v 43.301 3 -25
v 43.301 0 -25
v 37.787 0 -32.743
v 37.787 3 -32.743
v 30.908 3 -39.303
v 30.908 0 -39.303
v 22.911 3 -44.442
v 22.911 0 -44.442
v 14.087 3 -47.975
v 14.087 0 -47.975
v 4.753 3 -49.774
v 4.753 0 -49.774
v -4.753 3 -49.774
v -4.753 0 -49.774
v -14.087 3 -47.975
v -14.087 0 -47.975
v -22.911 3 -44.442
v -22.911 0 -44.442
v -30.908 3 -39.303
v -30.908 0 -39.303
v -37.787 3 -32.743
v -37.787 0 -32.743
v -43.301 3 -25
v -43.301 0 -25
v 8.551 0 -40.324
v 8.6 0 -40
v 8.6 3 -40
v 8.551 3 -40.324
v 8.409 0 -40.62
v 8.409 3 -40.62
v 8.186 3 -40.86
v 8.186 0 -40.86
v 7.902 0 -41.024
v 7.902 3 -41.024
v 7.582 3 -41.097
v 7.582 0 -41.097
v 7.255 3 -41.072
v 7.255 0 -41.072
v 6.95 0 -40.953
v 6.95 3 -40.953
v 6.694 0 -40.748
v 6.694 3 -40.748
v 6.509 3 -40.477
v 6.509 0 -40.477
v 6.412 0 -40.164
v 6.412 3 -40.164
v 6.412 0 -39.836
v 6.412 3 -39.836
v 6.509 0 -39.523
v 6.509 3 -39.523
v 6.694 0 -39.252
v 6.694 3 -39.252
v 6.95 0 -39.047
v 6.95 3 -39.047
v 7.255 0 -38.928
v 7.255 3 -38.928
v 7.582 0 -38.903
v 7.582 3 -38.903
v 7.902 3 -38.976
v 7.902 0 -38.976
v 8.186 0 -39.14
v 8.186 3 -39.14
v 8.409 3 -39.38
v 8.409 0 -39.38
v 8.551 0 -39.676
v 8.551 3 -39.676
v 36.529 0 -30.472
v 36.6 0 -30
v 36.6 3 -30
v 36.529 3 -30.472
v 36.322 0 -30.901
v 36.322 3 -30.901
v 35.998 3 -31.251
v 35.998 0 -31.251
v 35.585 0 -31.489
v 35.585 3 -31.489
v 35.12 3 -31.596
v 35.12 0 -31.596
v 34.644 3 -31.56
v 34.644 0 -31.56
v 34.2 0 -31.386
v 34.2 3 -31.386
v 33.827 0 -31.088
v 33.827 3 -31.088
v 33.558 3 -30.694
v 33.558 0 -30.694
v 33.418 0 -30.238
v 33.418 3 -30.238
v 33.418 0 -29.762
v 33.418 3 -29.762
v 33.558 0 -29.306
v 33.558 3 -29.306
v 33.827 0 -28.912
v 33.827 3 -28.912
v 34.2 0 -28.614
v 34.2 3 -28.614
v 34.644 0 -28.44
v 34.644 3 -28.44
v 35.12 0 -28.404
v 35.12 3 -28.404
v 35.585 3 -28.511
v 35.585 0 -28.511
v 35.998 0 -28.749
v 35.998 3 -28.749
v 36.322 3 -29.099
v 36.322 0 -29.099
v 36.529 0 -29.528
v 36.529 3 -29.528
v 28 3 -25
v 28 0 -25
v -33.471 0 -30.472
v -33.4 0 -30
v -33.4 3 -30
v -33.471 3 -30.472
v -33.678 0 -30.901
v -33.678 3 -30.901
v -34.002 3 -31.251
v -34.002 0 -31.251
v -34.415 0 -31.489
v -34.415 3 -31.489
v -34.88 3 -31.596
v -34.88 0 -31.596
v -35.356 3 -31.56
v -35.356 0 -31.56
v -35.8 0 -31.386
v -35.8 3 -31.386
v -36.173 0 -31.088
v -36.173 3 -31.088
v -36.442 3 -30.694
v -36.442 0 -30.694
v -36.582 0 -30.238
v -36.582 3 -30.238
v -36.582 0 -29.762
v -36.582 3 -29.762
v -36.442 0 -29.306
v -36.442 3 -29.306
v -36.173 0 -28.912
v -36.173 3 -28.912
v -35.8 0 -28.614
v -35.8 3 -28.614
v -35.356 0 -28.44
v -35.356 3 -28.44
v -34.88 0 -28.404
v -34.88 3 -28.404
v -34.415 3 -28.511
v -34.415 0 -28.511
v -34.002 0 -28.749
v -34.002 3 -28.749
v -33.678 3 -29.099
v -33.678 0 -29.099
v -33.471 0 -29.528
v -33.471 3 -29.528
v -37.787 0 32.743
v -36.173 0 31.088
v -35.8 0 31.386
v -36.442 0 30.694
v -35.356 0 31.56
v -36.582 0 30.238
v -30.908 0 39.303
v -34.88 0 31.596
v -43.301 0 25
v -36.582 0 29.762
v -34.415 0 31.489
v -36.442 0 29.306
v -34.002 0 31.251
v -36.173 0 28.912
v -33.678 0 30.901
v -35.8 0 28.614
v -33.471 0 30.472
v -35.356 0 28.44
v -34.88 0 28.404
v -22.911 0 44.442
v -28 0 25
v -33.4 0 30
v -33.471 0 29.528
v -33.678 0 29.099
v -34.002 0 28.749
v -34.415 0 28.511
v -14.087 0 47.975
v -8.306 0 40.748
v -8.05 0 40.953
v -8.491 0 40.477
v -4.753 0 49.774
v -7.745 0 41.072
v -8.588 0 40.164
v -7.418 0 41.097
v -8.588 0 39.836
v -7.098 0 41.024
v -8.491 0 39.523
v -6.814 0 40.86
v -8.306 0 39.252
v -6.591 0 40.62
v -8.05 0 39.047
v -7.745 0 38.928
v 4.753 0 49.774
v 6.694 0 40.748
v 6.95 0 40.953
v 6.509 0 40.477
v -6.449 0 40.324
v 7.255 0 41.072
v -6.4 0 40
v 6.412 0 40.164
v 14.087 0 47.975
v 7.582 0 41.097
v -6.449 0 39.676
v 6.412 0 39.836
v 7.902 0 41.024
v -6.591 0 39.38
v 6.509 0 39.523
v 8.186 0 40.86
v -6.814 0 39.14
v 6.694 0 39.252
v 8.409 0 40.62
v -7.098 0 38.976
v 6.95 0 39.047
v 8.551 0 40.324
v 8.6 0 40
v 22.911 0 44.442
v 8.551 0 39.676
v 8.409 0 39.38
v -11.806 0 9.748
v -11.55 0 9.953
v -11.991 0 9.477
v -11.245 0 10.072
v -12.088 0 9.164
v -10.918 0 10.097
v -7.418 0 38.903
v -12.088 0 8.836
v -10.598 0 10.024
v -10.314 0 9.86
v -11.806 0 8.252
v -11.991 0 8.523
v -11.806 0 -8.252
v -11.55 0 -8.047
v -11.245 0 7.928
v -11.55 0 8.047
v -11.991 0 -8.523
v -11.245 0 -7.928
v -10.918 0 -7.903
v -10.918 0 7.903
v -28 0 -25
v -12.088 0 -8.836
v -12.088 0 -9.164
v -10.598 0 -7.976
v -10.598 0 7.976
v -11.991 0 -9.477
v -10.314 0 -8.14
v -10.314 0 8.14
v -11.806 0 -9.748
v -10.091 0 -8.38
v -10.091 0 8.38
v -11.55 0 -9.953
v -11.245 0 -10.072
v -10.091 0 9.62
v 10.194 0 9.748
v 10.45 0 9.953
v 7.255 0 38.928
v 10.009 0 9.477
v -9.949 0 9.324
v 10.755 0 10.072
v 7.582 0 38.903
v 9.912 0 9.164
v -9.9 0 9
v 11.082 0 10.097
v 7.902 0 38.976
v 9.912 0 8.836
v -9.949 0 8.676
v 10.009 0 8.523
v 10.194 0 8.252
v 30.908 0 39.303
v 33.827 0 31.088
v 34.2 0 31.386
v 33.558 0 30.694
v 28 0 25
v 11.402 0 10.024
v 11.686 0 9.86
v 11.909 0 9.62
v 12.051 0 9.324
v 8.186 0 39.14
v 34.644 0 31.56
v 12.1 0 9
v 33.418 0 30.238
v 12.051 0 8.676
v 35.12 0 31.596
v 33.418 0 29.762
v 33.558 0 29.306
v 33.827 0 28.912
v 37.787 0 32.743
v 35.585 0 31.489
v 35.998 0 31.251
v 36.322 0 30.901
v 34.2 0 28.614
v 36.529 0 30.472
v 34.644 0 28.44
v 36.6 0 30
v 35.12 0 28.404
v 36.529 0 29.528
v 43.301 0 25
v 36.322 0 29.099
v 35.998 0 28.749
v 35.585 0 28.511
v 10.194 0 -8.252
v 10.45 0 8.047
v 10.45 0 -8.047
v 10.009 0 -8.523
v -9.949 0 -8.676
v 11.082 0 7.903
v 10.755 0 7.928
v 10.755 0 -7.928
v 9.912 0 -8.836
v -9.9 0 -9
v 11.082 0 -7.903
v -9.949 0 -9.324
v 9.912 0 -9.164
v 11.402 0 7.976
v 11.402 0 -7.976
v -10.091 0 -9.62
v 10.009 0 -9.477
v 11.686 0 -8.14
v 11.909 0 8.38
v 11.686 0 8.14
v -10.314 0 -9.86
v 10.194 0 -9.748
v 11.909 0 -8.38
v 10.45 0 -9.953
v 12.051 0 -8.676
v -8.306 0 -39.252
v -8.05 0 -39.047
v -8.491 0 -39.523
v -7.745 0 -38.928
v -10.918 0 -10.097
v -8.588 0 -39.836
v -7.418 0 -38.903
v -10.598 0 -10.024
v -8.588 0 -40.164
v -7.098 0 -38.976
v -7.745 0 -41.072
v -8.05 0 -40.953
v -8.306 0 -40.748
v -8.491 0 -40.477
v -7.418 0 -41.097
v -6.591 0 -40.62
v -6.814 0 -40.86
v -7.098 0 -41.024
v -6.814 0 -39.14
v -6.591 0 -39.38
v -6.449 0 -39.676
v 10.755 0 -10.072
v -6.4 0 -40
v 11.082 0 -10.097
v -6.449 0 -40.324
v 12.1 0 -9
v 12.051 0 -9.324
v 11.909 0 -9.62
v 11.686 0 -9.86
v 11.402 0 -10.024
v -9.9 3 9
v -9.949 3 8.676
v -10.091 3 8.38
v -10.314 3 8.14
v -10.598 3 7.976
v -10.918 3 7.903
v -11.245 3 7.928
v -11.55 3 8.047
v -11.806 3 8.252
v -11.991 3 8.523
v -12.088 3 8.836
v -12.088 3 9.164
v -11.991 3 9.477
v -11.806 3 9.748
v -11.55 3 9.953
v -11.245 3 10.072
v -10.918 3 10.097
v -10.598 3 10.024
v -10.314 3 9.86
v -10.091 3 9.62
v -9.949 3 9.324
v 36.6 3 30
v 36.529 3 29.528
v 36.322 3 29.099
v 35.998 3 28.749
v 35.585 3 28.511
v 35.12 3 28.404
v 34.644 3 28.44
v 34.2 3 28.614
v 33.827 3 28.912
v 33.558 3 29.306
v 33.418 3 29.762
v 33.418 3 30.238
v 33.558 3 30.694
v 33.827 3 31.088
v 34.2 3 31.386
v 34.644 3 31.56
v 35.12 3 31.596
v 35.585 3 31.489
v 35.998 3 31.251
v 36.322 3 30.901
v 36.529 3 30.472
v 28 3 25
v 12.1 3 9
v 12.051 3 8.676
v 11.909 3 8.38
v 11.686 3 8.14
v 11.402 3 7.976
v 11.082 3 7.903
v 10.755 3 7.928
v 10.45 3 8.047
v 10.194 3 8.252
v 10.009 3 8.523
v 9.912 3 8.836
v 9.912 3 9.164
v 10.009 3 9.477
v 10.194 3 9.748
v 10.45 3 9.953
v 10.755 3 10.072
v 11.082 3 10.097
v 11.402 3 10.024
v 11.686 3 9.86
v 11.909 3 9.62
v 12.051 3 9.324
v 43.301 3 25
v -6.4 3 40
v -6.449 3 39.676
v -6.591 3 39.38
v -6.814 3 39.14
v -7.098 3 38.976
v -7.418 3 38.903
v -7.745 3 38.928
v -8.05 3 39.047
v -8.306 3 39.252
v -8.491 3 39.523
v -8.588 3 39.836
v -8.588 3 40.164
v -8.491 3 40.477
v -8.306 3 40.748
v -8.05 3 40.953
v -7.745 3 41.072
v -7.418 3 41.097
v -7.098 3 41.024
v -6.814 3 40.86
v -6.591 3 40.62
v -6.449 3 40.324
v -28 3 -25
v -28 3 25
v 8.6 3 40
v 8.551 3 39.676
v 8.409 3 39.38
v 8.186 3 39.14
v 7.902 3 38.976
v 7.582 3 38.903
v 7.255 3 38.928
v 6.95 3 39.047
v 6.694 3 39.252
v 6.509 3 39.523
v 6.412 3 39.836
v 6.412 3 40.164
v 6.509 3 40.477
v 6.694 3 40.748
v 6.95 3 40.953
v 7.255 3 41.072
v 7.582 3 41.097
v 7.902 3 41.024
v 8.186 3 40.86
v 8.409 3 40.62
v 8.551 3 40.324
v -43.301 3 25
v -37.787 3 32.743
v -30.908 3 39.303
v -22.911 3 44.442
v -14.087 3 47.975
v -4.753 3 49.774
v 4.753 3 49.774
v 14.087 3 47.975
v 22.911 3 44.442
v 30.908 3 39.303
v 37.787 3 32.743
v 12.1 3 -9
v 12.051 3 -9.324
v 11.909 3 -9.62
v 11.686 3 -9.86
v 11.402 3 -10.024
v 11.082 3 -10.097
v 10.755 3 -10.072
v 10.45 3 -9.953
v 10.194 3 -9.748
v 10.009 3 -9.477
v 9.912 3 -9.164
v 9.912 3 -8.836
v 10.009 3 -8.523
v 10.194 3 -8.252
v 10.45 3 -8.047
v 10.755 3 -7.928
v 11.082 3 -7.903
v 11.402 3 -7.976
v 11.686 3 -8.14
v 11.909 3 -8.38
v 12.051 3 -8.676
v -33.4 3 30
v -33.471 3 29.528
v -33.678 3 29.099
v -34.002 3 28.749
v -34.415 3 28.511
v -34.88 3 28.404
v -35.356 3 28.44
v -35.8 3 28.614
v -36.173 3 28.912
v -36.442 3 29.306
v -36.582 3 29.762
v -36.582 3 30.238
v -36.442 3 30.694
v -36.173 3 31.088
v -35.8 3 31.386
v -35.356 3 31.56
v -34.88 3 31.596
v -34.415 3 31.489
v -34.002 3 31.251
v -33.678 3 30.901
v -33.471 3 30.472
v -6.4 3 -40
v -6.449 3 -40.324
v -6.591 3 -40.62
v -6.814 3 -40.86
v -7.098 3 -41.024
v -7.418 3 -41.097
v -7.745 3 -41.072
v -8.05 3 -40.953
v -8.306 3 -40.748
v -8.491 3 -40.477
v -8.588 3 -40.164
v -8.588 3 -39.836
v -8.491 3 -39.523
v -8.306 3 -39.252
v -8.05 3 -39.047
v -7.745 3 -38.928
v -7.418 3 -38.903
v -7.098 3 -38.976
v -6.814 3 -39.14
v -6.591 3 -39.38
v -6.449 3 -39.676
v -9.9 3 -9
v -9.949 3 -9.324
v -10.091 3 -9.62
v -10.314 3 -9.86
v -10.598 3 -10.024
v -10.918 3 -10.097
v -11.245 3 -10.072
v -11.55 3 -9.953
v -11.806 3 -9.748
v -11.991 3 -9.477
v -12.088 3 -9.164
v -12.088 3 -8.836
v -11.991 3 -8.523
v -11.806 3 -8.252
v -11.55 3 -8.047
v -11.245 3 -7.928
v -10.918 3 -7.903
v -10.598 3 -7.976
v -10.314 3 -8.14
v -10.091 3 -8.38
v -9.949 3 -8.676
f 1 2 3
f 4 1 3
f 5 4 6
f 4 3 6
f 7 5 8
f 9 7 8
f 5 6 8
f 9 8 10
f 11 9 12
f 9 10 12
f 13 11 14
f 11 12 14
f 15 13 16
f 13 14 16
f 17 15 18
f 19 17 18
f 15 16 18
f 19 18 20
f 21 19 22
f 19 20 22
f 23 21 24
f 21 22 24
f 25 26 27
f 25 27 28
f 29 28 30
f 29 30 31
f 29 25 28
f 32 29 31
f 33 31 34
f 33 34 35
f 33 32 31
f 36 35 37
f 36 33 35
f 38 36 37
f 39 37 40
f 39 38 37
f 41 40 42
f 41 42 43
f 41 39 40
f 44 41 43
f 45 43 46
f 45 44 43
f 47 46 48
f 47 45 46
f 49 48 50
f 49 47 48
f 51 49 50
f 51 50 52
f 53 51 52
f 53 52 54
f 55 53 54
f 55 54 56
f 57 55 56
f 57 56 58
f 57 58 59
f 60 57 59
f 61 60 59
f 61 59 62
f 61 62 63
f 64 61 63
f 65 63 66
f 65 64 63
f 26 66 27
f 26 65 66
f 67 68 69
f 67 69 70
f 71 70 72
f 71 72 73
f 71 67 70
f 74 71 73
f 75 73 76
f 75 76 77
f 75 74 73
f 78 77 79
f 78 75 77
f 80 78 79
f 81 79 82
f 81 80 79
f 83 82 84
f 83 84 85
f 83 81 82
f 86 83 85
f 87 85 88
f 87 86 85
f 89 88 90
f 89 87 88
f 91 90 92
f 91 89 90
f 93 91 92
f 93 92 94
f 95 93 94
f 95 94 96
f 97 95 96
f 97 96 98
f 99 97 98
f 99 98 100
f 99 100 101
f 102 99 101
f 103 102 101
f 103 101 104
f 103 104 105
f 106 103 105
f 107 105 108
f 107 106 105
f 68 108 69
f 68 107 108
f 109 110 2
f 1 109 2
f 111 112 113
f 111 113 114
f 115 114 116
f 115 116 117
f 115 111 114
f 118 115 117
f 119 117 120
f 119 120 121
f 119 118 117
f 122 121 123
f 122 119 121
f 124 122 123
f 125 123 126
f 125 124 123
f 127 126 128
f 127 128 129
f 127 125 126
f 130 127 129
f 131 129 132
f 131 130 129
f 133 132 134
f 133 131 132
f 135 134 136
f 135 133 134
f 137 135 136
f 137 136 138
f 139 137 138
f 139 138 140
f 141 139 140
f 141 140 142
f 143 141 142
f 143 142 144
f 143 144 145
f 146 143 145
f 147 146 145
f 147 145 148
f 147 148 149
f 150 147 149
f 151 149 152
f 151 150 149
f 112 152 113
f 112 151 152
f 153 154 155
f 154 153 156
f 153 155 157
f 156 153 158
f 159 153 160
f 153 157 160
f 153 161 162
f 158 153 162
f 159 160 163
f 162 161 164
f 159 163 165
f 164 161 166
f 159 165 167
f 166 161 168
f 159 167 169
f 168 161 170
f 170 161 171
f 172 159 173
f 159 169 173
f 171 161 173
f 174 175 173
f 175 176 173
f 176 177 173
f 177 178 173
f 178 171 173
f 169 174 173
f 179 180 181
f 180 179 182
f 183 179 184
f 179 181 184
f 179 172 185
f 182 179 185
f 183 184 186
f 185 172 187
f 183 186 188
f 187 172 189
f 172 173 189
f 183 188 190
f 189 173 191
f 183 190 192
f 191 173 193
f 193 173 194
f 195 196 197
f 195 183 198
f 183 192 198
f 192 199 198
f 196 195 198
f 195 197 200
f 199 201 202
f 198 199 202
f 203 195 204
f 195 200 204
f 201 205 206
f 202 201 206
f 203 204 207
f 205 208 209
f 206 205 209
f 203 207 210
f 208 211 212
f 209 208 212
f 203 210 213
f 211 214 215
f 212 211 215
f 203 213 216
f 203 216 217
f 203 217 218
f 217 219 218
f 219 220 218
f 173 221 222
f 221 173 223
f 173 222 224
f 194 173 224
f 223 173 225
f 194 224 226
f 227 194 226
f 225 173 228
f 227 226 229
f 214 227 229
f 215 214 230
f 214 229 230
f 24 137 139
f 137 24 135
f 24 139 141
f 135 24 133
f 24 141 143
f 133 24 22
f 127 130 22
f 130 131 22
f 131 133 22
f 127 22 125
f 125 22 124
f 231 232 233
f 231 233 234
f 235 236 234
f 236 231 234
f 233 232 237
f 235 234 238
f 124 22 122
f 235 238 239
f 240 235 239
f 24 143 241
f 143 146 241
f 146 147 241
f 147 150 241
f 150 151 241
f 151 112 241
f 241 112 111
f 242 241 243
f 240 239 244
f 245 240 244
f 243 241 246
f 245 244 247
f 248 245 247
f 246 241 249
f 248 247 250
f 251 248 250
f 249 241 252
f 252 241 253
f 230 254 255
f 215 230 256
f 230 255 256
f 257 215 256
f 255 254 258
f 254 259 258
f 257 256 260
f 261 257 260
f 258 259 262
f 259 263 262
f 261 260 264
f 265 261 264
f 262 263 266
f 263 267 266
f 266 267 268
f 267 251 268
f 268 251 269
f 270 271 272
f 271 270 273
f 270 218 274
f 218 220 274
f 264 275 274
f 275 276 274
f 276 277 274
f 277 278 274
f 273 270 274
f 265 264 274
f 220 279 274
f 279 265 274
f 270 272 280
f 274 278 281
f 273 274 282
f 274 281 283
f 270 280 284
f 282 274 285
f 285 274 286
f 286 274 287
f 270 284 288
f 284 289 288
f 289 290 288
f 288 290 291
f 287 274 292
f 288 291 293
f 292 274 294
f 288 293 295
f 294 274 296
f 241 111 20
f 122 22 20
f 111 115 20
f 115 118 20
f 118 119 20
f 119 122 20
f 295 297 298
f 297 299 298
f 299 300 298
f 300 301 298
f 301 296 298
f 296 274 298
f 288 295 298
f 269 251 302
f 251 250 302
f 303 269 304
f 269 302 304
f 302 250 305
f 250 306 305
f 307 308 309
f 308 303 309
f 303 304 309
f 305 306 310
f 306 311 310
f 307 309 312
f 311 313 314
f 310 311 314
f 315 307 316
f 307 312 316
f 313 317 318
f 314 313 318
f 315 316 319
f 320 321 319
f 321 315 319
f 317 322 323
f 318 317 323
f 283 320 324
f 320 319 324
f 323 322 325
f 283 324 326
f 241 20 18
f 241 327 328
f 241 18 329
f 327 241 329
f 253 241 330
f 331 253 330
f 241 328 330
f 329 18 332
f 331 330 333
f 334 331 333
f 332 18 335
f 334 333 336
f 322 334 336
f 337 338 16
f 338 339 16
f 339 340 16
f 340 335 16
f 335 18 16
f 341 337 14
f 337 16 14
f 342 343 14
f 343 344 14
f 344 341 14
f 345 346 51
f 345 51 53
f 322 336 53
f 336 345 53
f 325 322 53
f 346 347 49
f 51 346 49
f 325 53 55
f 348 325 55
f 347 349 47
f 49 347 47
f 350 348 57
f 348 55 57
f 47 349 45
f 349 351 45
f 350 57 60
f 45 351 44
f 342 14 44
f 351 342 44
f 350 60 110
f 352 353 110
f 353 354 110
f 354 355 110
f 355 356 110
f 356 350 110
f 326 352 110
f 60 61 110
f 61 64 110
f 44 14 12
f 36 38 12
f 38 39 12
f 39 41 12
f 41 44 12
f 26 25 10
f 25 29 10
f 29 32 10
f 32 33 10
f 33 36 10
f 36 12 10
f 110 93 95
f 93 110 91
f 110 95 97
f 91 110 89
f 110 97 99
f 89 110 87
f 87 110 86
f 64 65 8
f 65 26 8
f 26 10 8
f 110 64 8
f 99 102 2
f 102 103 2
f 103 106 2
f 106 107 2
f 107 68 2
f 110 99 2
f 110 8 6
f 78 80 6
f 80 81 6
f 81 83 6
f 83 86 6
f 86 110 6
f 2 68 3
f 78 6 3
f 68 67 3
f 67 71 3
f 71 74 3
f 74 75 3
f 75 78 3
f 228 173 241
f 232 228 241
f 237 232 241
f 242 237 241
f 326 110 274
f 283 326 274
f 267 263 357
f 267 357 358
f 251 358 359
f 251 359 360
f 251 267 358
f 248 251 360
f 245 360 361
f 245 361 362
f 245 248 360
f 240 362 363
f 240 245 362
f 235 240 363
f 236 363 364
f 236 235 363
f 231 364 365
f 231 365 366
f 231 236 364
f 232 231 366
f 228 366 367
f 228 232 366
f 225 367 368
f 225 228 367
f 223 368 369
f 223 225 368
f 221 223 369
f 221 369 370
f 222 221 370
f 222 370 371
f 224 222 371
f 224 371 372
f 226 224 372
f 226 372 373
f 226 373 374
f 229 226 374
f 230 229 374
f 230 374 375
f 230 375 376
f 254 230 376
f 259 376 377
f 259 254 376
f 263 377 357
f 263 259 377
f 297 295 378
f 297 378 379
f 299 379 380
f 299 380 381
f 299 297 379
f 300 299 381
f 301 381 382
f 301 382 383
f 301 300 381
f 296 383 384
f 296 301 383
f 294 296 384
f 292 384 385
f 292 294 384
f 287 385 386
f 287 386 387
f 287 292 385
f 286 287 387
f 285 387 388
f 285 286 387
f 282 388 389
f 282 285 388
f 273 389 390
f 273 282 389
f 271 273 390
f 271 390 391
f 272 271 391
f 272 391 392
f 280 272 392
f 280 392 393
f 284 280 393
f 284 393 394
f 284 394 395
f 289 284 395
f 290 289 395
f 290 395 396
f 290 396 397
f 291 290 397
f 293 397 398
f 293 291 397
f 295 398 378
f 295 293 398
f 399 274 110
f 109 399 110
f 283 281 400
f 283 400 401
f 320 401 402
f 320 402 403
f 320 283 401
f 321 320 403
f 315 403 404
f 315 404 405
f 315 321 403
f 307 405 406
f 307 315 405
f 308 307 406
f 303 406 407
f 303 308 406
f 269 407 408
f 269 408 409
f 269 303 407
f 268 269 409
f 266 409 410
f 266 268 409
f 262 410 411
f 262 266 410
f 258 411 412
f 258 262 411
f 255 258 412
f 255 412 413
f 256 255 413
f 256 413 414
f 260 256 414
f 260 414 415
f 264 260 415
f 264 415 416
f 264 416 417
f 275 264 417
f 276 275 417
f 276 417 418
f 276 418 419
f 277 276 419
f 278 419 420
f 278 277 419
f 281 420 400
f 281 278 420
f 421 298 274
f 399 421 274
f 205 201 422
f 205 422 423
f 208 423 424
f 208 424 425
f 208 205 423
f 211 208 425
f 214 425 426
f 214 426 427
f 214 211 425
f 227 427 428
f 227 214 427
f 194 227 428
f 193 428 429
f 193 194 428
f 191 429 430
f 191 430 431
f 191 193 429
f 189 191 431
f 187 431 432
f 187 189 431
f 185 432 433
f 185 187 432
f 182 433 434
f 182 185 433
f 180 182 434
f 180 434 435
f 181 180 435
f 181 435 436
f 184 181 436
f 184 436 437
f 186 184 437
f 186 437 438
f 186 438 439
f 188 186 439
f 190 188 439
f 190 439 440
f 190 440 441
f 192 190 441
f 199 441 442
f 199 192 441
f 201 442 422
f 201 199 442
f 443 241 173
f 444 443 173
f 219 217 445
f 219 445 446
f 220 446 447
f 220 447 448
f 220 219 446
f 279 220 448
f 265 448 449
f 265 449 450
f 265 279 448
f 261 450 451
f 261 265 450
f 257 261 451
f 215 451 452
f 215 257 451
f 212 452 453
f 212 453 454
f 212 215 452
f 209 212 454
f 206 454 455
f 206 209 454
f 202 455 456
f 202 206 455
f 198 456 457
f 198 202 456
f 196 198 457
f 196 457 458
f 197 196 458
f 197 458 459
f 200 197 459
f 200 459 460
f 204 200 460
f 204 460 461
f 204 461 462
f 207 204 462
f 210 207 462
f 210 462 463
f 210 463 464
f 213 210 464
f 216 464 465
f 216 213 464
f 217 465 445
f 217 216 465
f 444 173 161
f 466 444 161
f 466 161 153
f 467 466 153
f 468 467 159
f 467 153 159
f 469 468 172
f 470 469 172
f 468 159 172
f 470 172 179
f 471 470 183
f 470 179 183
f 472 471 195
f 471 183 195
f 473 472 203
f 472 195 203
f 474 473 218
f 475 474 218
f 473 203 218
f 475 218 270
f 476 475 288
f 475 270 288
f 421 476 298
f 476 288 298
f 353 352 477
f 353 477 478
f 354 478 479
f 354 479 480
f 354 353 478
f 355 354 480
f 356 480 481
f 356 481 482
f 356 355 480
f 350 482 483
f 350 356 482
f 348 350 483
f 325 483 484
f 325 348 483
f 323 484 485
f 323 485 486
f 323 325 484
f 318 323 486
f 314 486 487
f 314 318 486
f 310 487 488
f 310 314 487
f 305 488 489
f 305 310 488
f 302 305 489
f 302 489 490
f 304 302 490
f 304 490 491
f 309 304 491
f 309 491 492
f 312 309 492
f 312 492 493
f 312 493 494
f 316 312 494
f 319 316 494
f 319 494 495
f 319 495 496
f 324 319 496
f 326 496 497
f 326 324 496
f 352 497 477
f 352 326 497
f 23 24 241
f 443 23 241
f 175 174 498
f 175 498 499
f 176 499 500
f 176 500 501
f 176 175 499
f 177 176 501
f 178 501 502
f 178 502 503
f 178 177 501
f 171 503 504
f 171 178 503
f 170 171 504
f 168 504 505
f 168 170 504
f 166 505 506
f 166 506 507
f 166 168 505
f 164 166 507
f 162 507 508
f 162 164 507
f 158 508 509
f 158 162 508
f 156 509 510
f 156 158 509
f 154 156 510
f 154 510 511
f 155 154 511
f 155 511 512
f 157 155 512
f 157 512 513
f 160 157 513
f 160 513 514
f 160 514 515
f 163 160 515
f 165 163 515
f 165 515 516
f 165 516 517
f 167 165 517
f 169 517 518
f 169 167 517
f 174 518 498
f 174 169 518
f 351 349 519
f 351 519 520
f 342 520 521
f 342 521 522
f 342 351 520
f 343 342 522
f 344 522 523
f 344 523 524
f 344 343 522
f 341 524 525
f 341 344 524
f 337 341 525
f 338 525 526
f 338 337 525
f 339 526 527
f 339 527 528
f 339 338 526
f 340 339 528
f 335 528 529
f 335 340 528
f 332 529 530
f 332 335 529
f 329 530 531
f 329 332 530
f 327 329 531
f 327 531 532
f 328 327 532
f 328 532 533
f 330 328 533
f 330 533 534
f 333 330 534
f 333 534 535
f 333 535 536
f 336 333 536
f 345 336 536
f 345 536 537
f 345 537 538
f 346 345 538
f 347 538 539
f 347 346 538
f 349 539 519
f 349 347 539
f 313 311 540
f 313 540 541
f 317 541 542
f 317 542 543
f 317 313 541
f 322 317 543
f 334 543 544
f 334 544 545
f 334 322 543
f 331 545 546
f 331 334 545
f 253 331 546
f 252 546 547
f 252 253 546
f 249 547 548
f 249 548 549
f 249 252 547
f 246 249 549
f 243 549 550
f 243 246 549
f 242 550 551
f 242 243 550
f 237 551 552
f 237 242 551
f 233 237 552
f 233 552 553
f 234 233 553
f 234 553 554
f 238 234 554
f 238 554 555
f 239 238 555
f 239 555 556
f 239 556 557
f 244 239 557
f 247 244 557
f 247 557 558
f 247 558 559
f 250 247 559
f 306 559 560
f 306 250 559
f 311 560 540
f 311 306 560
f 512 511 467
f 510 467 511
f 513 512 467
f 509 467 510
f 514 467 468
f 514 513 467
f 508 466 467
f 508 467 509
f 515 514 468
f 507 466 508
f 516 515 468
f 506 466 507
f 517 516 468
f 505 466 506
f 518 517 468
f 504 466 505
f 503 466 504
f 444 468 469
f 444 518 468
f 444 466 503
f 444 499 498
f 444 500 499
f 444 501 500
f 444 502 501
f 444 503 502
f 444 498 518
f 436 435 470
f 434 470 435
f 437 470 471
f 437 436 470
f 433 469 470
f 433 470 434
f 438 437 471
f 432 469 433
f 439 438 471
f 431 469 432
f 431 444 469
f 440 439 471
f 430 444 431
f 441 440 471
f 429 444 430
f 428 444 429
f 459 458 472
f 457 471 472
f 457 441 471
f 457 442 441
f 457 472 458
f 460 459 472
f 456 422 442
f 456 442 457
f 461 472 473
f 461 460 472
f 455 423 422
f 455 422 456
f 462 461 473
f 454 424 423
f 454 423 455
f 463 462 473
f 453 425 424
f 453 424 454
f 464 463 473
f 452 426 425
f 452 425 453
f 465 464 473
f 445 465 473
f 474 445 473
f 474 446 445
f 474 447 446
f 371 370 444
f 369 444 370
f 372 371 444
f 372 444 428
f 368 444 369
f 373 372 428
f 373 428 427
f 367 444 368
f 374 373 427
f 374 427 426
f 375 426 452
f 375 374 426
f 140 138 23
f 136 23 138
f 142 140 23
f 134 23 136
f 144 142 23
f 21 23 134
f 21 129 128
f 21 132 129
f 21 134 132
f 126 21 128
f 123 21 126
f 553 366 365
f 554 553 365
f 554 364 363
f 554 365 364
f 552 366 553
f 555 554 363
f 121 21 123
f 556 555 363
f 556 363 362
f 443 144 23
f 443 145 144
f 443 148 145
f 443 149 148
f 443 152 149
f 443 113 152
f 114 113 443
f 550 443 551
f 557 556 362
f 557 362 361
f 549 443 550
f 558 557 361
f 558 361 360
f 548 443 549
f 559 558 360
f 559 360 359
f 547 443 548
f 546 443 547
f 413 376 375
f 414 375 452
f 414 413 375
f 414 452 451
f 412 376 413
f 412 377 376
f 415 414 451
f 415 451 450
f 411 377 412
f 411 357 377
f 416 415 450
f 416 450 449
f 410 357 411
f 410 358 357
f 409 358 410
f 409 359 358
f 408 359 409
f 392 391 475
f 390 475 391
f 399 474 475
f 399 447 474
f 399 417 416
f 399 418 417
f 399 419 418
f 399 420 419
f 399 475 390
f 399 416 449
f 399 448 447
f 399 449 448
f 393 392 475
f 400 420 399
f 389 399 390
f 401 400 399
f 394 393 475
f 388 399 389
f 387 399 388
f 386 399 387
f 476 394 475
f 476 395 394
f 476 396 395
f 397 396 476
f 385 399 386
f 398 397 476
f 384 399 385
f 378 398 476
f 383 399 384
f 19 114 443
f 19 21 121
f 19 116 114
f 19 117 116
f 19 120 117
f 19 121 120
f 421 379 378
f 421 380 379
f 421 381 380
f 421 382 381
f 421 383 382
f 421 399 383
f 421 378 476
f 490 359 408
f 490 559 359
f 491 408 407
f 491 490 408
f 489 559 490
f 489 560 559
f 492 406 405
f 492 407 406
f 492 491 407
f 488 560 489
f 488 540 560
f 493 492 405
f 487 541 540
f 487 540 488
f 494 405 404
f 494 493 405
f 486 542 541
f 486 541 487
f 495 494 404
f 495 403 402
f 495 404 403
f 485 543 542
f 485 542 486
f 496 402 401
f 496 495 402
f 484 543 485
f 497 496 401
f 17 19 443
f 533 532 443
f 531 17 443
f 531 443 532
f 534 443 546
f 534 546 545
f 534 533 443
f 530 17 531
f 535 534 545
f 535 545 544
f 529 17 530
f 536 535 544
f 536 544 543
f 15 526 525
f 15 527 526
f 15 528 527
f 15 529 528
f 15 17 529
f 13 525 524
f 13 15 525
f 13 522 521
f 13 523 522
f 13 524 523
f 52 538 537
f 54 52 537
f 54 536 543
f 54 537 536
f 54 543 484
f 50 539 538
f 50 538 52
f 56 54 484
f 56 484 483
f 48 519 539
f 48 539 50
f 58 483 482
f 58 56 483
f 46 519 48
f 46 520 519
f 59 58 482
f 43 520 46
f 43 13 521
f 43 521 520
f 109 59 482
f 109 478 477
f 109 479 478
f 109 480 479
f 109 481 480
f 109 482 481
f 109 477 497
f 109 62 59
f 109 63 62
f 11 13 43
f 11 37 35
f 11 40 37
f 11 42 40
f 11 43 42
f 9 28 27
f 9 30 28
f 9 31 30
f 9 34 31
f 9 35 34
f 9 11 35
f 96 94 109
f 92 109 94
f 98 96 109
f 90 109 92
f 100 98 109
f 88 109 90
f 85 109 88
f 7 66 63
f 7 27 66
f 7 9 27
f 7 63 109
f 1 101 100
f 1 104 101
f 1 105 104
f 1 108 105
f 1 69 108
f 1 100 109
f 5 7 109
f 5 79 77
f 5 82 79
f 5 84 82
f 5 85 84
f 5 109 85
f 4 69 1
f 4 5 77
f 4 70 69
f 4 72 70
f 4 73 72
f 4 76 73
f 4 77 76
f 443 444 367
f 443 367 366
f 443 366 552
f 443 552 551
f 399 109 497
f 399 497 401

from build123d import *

# Parameters (mm, degrees)
SKETCH1_R           = 1.1
SKETCH1_R_2         = 1.6
BOSS_EXTRUDE1_DEPTH = 3


with BuildPart() as part:
    # Sketch1 → Boss-Extrude1 (new body)
    with BuildSketch(Plane(origin=(0, 0, 0), x_dir=(1, 0, 0), z_dir=(0, 1, 0))):
        with BuildLine():
            Line((-28, 25), (-28, -25))
            Line((-28, -25), (-43.301270189, -25))
            ThreePointArc((-43.301270189, -25), (0, -50), (43.301270189, -25))
            Line((43.301270189, -25), (28, -25))
            Line((28, -25), (28, 25))
            Line((28, 25), (43.301270189, 25))
            ThreePointArc((43.301270189, 25), (0, 50), (-43.301270189, 25))
            Line((-43.301270189, 25), (-28, 25))
        make_face()
        with Locations((-11, 9)):
            Circle(SKETCH1_R, mode=Mode.SUBTRACT)
        with Locations((-7.5, 40)):
            Circle(SKETCH1_R, mode=Mode.SUBTRACT)
        with Locations((-7.5, -40)):
            Circle(SKETCH1_R, mode=Mode.SUBTRACT)
        with Locations((-11, -9)):
            Circle(SKETCH1_R, mode=Mode.SUBTRACT)
        with Locations((7.5, -40)):
            Circle(SKETCH1_R, mode=Mode.SUBTRACT)
        with Locations((7.5, 40)):
            Circle(SKETCH1_R, mode=Mode.SUBTRACT)
        with Locations((11, 9)):
            Circle(SKETCH1_R, mode=Mode.SUBTRACT)
        with Locations((11, -9)):
            Circle(SKETCH1_R, mode=Mode.SUBTRACT)
        with Locations((-35, 30)):
            Circle(SKETCH1_R_2, mode=Mode.SUBTRACT)
        with Locations((-35, -30)):
            Circle(SKETCH1_R_2, mode=Mode.SUBTRACT)
        with Locations((35, 30)):
            Circle(SKETCH1_R_2, mode=Mode.SUBTRACT)
        with Locations((35, -30)):
            Circle(SKETCH1_R_2, mode=Mode.SUBTRACT)
    extrude(amount=BOSS_EXTRUDE1_DEPTH)


solid = part.part
